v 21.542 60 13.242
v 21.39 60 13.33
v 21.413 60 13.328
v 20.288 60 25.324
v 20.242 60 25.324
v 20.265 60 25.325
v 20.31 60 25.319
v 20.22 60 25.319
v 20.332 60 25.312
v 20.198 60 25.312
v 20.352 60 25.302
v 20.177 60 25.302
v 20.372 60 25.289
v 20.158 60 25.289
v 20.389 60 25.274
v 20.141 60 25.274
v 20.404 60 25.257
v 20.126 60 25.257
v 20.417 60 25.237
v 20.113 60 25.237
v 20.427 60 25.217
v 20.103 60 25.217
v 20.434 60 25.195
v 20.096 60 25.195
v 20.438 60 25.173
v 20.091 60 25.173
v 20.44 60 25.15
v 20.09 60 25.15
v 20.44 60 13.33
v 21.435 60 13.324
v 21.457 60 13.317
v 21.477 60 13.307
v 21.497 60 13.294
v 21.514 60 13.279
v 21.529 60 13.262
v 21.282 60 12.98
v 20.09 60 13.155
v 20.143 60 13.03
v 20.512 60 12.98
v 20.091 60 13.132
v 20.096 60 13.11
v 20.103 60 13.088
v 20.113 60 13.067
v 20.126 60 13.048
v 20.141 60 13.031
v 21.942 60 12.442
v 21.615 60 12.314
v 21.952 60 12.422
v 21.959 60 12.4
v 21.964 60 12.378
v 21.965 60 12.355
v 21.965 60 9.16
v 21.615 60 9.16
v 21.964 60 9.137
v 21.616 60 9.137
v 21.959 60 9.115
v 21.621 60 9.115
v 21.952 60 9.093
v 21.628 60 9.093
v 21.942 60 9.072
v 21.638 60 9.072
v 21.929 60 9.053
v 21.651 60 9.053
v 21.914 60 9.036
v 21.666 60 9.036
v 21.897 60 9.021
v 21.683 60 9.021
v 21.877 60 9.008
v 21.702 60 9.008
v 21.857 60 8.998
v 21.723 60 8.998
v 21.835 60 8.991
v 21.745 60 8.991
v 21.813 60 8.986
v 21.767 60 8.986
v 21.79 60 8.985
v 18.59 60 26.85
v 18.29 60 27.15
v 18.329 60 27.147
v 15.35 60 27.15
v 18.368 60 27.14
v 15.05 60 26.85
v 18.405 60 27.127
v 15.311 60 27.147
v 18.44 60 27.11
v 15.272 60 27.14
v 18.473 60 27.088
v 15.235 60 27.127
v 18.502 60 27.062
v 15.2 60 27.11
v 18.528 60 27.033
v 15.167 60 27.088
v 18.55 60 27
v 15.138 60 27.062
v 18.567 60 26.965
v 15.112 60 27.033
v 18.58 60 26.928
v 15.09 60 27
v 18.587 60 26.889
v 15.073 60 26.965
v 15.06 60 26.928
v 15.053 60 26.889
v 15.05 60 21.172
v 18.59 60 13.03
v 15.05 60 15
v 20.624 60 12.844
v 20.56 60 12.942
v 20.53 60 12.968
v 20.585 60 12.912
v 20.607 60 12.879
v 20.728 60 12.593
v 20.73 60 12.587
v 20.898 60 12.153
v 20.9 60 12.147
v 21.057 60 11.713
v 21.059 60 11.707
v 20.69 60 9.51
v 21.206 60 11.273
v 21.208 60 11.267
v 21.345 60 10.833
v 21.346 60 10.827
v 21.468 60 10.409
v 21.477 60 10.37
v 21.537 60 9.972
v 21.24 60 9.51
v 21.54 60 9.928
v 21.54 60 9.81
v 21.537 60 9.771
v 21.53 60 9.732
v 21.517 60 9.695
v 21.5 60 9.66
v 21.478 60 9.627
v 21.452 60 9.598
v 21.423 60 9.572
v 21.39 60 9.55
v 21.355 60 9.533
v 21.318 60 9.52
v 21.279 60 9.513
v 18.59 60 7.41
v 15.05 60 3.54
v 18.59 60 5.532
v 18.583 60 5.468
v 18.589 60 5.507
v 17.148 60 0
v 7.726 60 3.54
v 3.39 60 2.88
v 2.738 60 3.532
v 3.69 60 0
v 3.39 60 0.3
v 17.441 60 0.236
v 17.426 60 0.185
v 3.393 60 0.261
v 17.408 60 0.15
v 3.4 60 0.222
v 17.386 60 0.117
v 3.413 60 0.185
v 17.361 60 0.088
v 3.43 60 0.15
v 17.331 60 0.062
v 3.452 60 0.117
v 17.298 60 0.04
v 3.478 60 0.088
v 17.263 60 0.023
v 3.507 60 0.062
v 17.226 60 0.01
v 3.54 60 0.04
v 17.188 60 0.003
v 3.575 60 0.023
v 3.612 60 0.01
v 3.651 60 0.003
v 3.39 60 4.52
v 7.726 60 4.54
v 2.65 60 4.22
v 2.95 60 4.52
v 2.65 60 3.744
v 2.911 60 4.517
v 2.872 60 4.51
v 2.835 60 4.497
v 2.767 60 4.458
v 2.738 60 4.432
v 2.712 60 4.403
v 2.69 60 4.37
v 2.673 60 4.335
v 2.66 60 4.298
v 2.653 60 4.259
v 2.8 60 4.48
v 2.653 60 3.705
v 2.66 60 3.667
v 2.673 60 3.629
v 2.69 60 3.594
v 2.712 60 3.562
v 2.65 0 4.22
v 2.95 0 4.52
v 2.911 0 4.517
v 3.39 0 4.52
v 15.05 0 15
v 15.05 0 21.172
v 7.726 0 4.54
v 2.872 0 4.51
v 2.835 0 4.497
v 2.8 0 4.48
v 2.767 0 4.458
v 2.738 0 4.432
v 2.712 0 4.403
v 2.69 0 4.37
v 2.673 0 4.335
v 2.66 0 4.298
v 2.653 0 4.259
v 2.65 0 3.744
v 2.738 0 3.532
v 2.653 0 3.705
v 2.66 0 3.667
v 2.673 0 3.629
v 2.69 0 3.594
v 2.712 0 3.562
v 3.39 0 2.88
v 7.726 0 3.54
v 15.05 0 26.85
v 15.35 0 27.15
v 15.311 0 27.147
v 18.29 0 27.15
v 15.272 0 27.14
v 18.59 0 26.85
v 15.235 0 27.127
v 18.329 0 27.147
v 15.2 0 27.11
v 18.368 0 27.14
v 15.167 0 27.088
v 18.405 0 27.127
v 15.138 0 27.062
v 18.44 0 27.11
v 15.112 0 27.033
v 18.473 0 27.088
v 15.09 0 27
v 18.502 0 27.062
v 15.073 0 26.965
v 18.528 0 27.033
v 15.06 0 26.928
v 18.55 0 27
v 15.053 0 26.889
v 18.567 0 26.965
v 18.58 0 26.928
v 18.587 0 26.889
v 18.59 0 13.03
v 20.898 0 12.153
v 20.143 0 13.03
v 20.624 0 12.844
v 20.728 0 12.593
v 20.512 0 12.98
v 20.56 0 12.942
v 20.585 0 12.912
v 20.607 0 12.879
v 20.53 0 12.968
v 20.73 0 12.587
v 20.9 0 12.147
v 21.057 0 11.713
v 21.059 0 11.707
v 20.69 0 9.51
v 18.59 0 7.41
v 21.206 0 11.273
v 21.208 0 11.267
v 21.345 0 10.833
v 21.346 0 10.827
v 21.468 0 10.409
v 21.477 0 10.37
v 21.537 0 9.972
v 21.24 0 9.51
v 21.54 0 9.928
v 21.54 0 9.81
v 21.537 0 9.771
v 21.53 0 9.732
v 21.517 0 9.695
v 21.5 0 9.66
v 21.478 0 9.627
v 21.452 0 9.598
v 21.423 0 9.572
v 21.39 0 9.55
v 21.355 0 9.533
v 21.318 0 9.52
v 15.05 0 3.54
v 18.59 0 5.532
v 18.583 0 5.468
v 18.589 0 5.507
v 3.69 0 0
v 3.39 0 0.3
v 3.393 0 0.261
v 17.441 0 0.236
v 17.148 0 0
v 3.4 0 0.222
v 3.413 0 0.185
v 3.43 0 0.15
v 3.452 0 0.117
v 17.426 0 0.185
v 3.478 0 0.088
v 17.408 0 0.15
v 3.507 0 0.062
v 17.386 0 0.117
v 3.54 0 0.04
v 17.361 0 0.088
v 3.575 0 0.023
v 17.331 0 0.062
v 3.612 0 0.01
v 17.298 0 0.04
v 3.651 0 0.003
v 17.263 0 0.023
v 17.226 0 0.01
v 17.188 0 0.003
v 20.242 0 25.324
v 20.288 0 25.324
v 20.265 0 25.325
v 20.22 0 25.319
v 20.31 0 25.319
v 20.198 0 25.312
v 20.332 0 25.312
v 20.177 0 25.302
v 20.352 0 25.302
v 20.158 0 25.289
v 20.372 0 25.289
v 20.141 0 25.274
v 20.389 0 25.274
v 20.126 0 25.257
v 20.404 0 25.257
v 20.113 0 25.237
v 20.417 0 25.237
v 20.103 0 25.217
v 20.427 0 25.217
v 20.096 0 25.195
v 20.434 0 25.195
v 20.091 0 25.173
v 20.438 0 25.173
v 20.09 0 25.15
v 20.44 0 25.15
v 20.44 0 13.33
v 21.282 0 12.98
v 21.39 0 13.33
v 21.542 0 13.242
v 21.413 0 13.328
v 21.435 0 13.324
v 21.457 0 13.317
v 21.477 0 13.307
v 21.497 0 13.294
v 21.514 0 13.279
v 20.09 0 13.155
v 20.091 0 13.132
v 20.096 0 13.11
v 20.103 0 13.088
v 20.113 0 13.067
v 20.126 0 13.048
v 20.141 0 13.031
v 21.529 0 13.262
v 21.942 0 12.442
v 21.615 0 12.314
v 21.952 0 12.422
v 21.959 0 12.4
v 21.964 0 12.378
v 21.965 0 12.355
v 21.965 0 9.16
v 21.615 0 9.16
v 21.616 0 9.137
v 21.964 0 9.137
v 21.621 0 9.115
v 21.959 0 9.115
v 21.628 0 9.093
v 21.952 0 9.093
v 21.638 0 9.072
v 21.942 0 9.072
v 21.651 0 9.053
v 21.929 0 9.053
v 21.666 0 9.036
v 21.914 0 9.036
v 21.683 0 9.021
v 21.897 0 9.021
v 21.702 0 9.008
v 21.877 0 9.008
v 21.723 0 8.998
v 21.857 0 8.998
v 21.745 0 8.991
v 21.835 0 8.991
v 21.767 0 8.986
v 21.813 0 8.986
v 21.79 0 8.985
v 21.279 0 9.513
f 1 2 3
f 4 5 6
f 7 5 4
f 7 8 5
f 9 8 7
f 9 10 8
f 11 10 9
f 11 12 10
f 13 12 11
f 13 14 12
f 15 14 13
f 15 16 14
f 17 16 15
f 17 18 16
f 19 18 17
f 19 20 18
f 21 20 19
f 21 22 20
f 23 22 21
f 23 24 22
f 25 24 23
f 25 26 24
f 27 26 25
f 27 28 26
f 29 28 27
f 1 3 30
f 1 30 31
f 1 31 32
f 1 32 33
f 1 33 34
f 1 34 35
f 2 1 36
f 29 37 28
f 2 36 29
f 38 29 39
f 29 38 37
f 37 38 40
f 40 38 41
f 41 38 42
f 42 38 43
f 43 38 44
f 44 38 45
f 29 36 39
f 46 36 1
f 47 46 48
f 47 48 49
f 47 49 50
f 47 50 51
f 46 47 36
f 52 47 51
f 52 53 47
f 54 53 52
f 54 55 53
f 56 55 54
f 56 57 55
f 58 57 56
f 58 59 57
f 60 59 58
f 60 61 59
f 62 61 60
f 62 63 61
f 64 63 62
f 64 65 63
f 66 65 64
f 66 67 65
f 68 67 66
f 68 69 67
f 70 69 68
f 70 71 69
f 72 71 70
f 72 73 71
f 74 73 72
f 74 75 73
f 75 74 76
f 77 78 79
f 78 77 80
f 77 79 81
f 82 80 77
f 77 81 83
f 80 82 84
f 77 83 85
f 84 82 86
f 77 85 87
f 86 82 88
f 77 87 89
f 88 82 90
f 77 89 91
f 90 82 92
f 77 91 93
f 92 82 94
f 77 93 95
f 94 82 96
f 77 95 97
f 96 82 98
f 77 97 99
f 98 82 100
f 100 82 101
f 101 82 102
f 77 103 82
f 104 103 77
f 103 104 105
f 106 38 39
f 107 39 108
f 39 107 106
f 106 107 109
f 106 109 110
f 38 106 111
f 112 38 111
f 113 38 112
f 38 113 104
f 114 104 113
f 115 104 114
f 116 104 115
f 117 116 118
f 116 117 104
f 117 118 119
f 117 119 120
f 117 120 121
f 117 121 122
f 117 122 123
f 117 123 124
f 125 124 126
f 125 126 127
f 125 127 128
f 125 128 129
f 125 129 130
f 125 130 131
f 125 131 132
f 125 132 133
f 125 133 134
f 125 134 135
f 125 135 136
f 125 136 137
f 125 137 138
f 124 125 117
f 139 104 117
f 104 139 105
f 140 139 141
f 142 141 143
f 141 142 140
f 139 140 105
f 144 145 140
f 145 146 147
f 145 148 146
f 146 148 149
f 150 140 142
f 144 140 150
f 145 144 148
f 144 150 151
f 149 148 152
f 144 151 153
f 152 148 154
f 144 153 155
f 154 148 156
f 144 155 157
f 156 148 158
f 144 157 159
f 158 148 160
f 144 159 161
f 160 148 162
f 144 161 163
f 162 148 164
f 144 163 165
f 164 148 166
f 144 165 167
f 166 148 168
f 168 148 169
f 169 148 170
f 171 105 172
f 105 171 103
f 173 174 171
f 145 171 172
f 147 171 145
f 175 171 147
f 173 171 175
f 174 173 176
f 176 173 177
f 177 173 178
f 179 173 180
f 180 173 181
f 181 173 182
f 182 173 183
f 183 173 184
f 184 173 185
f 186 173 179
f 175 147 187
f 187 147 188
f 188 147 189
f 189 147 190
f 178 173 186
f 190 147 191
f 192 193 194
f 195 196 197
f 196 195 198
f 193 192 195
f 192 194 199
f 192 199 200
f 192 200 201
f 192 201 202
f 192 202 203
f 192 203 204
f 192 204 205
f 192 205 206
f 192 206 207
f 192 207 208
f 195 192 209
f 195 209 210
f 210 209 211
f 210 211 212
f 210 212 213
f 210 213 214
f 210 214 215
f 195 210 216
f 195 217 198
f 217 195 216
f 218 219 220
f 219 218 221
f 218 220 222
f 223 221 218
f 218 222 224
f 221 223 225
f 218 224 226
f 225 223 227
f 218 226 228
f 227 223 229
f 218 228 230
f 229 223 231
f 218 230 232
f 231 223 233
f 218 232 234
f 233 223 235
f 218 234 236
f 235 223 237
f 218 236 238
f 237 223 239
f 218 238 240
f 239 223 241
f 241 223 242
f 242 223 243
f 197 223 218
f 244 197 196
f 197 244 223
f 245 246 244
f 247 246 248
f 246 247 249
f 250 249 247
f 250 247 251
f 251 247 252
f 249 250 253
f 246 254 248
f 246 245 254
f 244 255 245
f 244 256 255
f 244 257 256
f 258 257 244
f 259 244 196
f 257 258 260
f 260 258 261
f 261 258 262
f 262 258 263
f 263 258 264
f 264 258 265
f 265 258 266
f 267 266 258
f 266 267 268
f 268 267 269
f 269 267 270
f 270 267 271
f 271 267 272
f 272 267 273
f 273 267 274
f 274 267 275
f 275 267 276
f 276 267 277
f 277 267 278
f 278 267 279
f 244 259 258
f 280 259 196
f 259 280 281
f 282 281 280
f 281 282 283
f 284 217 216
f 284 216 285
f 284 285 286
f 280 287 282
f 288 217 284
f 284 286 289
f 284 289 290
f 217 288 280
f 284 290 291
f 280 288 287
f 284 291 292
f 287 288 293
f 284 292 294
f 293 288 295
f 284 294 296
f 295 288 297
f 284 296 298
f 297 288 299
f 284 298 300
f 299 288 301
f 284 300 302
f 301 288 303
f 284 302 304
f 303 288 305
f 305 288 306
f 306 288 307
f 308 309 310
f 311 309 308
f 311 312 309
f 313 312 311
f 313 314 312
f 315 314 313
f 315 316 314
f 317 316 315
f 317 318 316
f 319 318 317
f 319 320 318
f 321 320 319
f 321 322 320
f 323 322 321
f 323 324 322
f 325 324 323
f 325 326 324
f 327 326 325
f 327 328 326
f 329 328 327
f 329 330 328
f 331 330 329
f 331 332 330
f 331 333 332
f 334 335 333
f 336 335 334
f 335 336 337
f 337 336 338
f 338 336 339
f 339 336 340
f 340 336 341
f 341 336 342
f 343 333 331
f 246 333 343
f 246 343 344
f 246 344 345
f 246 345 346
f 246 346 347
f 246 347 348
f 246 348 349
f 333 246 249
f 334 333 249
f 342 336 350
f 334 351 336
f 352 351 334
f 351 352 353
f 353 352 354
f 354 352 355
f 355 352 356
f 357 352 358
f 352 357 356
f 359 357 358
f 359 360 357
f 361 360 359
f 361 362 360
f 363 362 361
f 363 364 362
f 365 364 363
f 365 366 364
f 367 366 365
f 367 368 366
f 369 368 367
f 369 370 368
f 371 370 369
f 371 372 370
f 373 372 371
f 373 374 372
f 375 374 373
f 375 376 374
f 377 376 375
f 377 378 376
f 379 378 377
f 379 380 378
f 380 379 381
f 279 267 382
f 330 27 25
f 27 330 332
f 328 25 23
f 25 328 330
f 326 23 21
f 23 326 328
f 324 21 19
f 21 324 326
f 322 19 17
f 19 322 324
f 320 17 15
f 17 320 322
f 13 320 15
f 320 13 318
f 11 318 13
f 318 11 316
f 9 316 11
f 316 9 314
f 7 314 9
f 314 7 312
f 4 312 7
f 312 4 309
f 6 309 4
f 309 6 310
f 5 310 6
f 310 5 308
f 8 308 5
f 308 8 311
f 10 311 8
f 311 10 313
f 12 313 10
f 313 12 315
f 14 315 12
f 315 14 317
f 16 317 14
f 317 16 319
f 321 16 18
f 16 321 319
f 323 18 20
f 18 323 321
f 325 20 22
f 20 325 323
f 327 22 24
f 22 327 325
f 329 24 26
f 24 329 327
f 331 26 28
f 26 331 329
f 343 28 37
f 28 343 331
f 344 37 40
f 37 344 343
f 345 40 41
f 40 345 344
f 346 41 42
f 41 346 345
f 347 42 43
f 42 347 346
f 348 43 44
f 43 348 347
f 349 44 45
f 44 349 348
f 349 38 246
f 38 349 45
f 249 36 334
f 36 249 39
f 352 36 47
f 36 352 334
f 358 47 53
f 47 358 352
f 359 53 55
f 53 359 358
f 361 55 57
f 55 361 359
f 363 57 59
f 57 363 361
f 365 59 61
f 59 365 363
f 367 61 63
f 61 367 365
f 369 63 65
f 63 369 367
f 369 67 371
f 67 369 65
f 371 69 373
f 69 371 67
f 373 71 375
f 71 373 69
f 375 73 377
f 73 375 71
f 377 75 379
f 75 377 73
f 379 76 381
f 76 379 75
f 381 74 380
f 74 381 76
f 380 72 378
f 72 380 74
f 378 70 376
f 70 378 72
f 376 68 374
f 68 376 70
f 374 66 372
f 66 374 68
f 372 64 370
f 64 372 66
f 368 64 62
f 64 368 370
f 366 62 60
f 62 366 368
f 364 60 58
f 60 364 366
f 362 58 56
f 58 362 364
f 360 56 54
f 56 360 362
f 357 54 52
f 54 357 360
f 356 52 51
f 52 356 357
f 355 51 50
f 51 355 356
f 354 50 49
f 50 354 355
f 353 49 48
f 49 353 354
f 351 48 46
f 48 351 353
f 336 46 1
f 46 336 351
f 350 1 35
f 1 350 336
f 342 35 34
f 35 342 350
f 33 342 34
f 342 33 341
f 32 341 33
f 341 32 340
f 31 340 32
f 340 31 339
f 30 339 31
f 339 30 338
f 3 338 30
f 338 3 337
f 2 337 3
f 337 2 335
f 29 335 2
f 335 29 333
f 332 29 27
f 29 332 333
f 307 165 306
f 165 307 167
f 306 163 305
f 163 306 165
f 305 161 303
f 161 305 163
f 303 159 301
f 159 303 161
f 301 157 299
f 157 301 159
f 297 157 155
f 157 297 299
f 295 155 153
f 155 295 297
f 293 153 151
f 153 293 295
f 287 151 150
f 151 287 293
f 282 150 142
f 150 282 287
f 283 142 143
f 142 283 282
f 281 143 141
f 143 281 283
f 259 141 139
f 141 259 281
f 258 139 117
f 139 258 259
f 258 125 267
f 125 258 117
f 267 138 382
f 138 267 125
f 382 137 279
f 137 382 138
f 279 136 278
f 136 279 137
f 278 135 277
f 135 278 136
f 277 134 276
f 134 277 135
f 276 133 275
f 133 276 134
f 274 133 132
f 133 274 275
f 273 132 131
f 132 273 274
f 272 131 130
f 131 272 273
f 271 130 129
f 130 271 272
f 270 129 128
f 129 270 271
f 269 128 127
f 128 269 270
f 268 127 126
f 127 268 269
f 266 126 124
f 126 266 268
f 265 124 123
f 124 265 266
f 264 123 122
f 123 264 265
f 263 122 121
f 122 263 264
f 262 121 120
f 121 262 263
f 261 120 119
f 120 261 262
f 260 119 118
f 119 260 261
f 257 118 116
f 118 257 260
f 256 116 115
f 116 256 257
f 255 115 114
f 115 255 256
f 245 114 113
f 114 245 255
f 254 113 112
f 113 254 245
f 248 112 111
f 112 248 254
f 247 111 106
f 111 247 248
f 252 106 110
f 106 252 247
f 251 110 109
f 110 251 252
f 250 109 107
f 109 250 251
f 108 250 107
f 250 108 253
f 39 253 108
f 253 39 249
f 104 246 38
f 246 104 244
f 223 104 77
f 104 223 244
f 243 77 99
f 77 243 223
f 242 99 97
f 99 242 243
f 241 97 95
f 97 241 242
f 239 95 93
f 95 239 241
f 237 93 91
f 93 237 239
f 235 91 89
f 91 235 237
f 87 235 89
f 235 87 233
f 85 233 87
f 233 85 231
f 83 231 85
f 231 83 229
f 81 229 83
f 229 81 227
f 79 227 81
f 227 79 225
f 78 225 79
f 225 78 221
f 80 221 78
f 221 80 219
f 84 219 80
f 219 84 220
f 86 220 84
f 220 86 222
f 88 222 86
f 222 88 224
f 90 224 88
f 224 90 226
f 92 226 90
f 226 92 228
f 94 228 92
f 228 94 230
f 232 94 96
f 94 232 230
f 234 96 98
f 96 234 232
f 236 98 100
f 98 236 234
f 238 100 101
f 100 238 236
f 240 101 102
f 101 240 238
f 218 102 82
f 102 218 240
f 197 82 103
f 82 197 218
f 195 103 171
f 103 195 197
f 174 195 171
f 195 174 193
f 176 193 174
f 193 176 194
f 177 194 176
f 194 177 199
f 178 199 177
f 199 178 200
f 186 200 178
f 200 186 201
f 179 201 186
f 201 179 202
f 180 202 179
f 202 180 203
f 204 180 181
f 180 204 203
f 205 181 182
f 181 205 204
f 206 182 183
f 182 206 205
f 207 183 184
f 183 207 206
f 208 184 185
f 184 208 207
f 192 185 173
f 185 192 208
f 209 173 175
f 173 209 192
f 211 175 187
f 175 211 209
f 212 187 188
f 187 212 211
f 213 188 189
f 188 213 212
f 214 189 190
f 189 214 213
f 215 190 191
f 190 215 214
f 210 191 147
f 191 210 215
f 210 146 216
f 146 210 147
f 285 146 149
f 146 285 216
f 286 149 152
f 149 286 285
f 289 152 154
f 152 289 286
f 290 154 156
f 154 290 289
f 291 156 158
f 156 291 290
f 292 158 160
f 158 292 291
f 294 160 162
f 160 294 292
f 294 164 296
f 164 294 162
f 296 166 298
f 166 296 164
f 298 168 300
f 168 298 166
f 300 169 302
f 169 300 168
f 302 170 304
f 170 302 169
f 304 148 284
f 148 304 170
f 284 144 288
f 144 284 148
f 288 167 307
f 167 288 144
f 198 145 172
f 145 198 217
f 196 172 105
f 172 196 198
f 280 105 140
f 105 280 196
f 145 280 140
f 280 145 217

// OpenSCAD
// screen-fence-rail.scad
//
// Snap-in fence for the bottom track of the roll-up screen doors. It drops into
// the track from the room side, hooks under the near wall's internal ledge, and
// reaches across to trap the screen mesh under the far wall's top lip — so a cat
// can no longer pull the mesh out of the channel and climb under it.
//
// Replaces _incoming/screen-fence-rail.stl, which was glued into the channel
// and failed twice over: the bond let go, and it did not actually stop the cats.
// Nothing here is glued.
//
// ---------------------------------------------------------------------------
// THE TRACK, AS MEASURED
// ---------------------------------------------------------------------------
// Reverse-engineered from _incoming/bottom-track-dimensions.png. That drawing
// is to scale: its 23.8 mm width, 15.9 mm height and 6.4 mm ledge datum all
// resolve to 56.66 px/mm, three independent agreements. Its "9.5 mm" is the
// only figure that does not — the extension line sits 1.6 mm high — but 9.5
// is 15.9 - 6.4, so the VALUE is right and only its witness line is misplaced.
//
// The profile is an aluminium extrusion, 0.76 mm wall throughout, 23.80 mm
// across the outside, 15.90 mm tall, with an inner floor 0.79 mm above the
// outer bottom. Every number below is referenced to that inner floor, and to
// the inner face of one wall, because those are the surfaces a part inside the
// channel actually touches. Each wall carries three inward features:
//
//     z 4.77 - 5.65   LEDGE      reaches 3.14 mm inboard   (gap 15.76 mm)
//     z 6.96 - 9.01   MID HOOK   reaches 1.35 mm inboard   (gap 19.34 mm)
//     z 13.28 - 15.15 TOP LIP    reaches 1.35 mm inboard   (gap 19.34 mm)
//
// ⚠️ These are read off a drawing, not off the rail. The outline is drawn with
// a 0.26 mm line and the readings take its inner edge, so the real clear space
// is up to ~0.13 mm larger than assumed here — i.e. the part errs small, which
// is the safe direction. The one figure worth a caliper before printing 200 mm
// is the 22.04 mm clear width; print show="coupon" and try the three fits.
//
// ---------------------------------------------------------------------------
// WHY THIS SHAPE
// ---------------------------------------------------------------------------
// The mesh floats free in the channel. The first version of this part left it a
// clear 2.10 mm slot and only stopped it being pushed INBOARD — which was not
// the failure: the mesh is flexible, the cats pull it up OUT of the channel and
// go under. Holding it therefore means gripping the mesh itself, not just
// walling it in. See the back grip parameters.
//
// The part still cannot be a symmetric two-sided snap. The mesh must remain free
// to slide along the track, and a rigid part cannot engage an undercut on both
// walls at once and still get in — see the dead ends below. So the structural
// grip comes off the near wall alone, and the far side does its work by pinching
// rather than by hooking under anything it has to fight its way past.
//
// Of the three features on that wall the LEDGE is the one worth having: 3.14 mm
// of positive undercut against 1.35 mm at either hook, and the chamber beneath
// it is the one region of the section the mesh cannot reach (the far ledge stops
// the mesh descending past z 5.65). So the part carries a wedge-shaped tongue
// that slides under the near ledge, and stands on the channel floor.
//
// It is NOT a cantilever snap. Nothing here has to flex to go in: tilt the part
// so the tongue leads, slide the tongue under the ledge, then rotate the far
// side down until the base plate lies on the floor. That was a deliberate
// choice — a PETG finger long enough to clear the 1.35 mm hooks without
// over-straining has to be anchored above the rail, and every version of that
// put a truss in a doorway. Seated, the part is held by:
//
//   * UP          the tongue, under 2.84 mm of aluminium ledge.
//   * DOWN        the base plate, flat on the channel floor.
//   * OUTBOARD    the ramp root, 0.25 mm off the near ledge tip.
//   * INBOARD     the fence face, 0.31 mm off the far ledge tip — so the part
//                 can travel a third of a millimetre before it is stopped, and
//                 the tongue never comes close to disengaging.
//   * TIPPING OUT a push on the fence from the room side is the load case that
//                 matters, and it drives the tongue harder under the ledge.
//   * THE BACK    the rib's top face sits under the far top lip with 0.85 mm of
//                 overlap, so the far side is positively capped as well.
//
// Rotating the far side up is the removal motion, and the only way out. A cat
// is on the wrong side of the fence to do it.
//
// MESH SAFETY. The mesh is squeezed, so the faces that touch it matter. Every
// corner it wraps is rounded by the global fillet, the pinch bears on a flat
// 0.85 mm land rather than an edge, and the fence face is printed as a vertical
// wall so its layer lines run along the direction the mesh travels. The pinch is
// a tenth of a millimetre on a compressible woven mesh — enough for friction,
// not enough to cut. back_pinch is the number to tune, and the coupon ladders
// it.
//
// STRENGTH. The fence is the handle, so it is sized for hand loads, not for
// looks: the first printed coupon snapped the moment it was pushed on. Printed
// lying down, pushing or pulling the fence bends it ACROSS the layers, so the
// two levers that matter are its thickness (wall, doubled to 3.54) and its
// unsupported length (set by ramp_angle, which carries the ramp up to meet it
// 6 mm from the top instead of 11). Together, about 8x less root stress.
//
// PRINT. Lying down, cross-section in the bed's XZ, length along Y — as built.
// The base plate gives a 15.2 x seg_len first layer and the fence face is a
// vertical wall. The only overhang is the tongue's underside, cut at 45 deg.
// Fence and mesh face are both 1.74 mm, four lines at the 0.4 nozzle's real
// inner width. PETG.

/* [Output] */

// "fence" is the printable part. "coupon" is three 30 mm slices at different
// back pinches — print it and find which one grips the mesh and still rotates
// home, before committing to a full segment.
//
// "track" is the aluminium extrusion itself, drawn from the measured profile,
// and "assembly" shows the fence hooked into it with the mesh in the slot.
// Both are previews for checking the interlock by eye — NOT for printing. If
// you ever want one as an STL, build it with --name so it does not overwrite
// the fence's own version series.
// "fitcheck" is the interference test — see the module.
//
// This defaults to a PREVIEW, not the part, so that opening the file in
// OpenSCAD shows the fence in the rail without touching anything. The cost is
// that building the part now needs the flag:
//
//     utils/build.sh parts/screen-fence-rail.scad -D 'show="fence"'
//
// A bare build.sh run would otherwise stamp the assembly into the fence's own
// version series and leave stl/screen-fence-rail.stl pointing at a rail with a
// fence inside it. There is an echo at the bottom of this file to catch that.
show = "assembly";  // [fence, coupon, track, assembly, fitcheck, compare, concepts, fixture]

// COUPON-COMPONENTS: fit=coupon
// COUPON-PLATE: coupon

/* [Track — MEASURED, see header. Do not change without re-measuring] */

// Clear width of the channel, inner wall face to inner wall face (mm).
trk_clear_w  = 22.04;
// Inner floor to the top of the walls (mm).
trk_depth    = 15.15;
// How far the mid hooks and the top lips reach inboard of the wall face (mm).
trk_hook_x   = 1.35;
// How far the lower ledge reaches inboard of the wall face (mm).
trk_ledge_x  = 3.14;
// Underside of the lower ledge, above the inner floor (mm).
trk_ledge_z0 = 4.77;
// Top face of the lower ledge, above the inner floor (mm).
trk_ledge_z1 = 5.65;
// Underside and top of the mid hook, above the inner floor (mm).
trk_hook_z0  = 6.96;
trk_hook_z1  = 9.01;
// Underside of the top rolled lip, above the inner floor (mm).
trk_lip_z0   = 13.28;

/* [Track shell — drawing only, nothing is designed against these] */

// Outside of the extrusion (mm) — the two figures the drawing dimensions
// directly, and the two that fixed its scale.
trk_outer_w = 23.80;
trk_outer_h = 15.90;

// Wall and base skin (mm), from the centre-to-centre spacing of the drawn wall
// lines.
//
// NOTE the deliberate inconsistency: 23.80 - 2 x 0.77 is 22.26, but
// trk_clear_w above is 22.04. That is not an error. 22.04 is the reading taken
// from the INNER edges of those same lines, and the fence is designed against
// it precisely because it is the pessimistic one — the part comes out up to
// 0.22 mm narrower than it needs to be, which is the safe direction. So the
// preview shows about 0.11 mm more room per side than the fence assumes. Below
// the drawing's resolution, and it errs the right way.
trk_skin = 0.77;

// Diameter of the void inside the rolled hook and the rolled top lip (mm).
// Cosmetic — it is what makes them read as curls rather than plain beads.
trk_roll_void = 0.55;

/* [Concept study — previews only, none of these is print-ready] */

// The rotate-in concept is dead: a full configuration-space path search says
// the seated pose is unreachable, and the maximum under-ledge engagement any
// RIGID motion can insert is 0.54 mm against the 2.84 mm designed. See the
// round 01f notes. These are the three replacements, drawn to compare.
//
//   slide  Today's section, unchanged. Only goes in by sliding along the rail
//          from its end. Keeps the deep tongue, the deep rib and positive
//          retention every way. Strongest by far; needs end access.
//   drop   Fits the 15.76 mm gap between the ledge tips at EVERY height, so it
//          lowers straight in. The deep back rib cannot exist. Hold-down is
//          barbs that flex in past the ledge tips and spring out under them;
//          the mesh is pinched against the far hook tips by the fence face.
//   key    Two pieces. The body drops in, slides outboard under the far ledge;
//          then a key drops in beside it and slides under the near ledge,
//          filling the gap so neither can come back. Positive at both ends and
//          nothing flexes, at the cost of a second piece to fit each time.
concept = "slide";  // [slide, drop, key]

// Clearance each side of the ledge-tip aperture for the drop-in body (mm).
drop_clr = 0.23;
// How far the key concept's body slides outboard once it is down (mm).
key_push = 2.40;
// How far the drop concept's barbs stand out past the body's face (mm). Net
// engagement under the ledge tip is this minus drop_clr, so 1.50 buys 1.27 mm
// of hook — and costs 1.50 mm of inward flex on insertion, which needs a leg
// of at least 10.2 mm at 1.29 mm thick to stay inside PETG's strain budget.
drop_barb = 1.50;

/* [Test fixture — a printable stand-in for the real rail] */

// A length of the channel to print and keep on the bench, so insertion can be
// tried without going upstairs to the door.
//
// It is NOT a replica of the extrusion. Only the INTERNAL surfaces matter for
// testing whether a part goes in, so the outside is a solid block: it prints
// rigid, sits flat on any face, and gives a real first layer instead of the
// 0.77 mm ribbon the aluminium's own section would.
//
// PRINT IT STANDING UP — the channel axis vertical, which is how it is built
// here. That puts every internal face vertical, so the ledges' undersides and
// the rolled hooks come out as walls rather than overhangs, and the two
// apertures the insertion actually depends on are formed accurately. Printed
// lying down, the ledge undersides are 3.14 mm of unsupported horizontal
// overhang and the apertures would close up. Use it lying down once printed.
fixture_len  = 60;
// Solid wall around the cavity (mm).
fixture_wall = 3.0;
// Grow every aperture by this much per face (mm).
//
// Start at 0, print it, then mike the three numbers that matter and compare:
// overall clear width 22.04, the mouth between the top lips 19.34, and the gap
// between the ledge tips 15.76. This machine has no XY compensation set and a
// bore has measured 0.3 mm undersize per side in PETG, which would make the
// fixture TIGHTER than the real rail — the wrong direction, since it would
// fail parts that actually fit. Dial this until the printed apertures match.
fixture_comp = 0.00;

/* [Preview] */

// Length of track and fence drawn for "track" and "assembly" (mm). Short, so
// the section stays legible in a render.
preview_len = 60;

// Thickness of the mesh drawn in the slot (mm), and how far it stands above the
// top of the rail. Representative only — the mesh floats and is not modelled
// as anything but a flat strip.
mesh_t = 0.35;
mesh_rise = 10;

// Opacity of the track and the mesh in "assembly" — 0 invisible, 1 solid.
//
// The channel is a closed box in section, so an opaque rail hides the fence
// from every angle except looking straight down into it. Ghosting the track is
// what lets you see the tongue under the ledge and the fence at the same time.
// Transparency only works in Preview (F5); F6 discards it along with the
// colours. Set both to 1 if you want the view from outside, as installed.
// 0.25 was a mistake: silver that faint washes out to the background and the
// rail reads as missing. 0.55 is see-through and still obviously there.
track_alpha = 0.55;
mesh_alpha  = 0.70;

/* [Fit] */

// Clearance to every track surface (mm). Drives the tongue height and how
// close the part sits to the near ledge, so it is the one number the coupon
// tests. 0.25 is the 0.4-nozzle snug figure from the printer reference.
clr = 0.25;

// Clear slot left for the mesh, between the fence face and the far wall's
// hooks (mm). This also sets how far the part can shift before the far ledge
// tip stops it, so keep it well under the 2.84 mm the tongue engages.
mesh_slot = 2.10;

/* [Back grip — what actually holds the mesh down] */

// A free slot does not retain a flexible mesh: the cats pull it out and go
// under. So the back of the part carries a rib that reaches outboard into the
// recess between the far wall's mid hook and its top lip — 4.27 mm of clear
// height, the biggest feature on that wall. The mesh gets swept outboard as the
// part rotates home, drapes over the rib's top face and hangs down the slot
// outboard of it, and is then squeezed between that top face and the underside
// of the aluminium top lip. Pulling the mesh up only tightens it around the
// rib's corner. The rib's top face is also the back hold-down: it sits under
// the top lip with 0.85 mm of overlap.
back_grip = true;

// Gap between the rib's top face and the underside of the far top lip (mm).
// This is the pinch, so it wants to be a little LESS than the mesh is thick —
// the mesh is compressible and the faces either side of it are radiused. Too
// tight and the part will not rotate home; too loose and the mesh slides.
// The number to try first on the coupon.
back_pinch = 0.25;

// Slot left outboard of the rib for the mesh to hang down in (mm). Also caps
// how deep the rib goes at its lowest, where the swept arc is not the limit.
back_slot = 0.50;

// The front point the part rocks about, as (x, z) above the inner floor.
//
// The rib's back face is GENERATED from this — see rib_back() — so the shape
// cannot drift from the analysis that produced it. Rocking the part in sweeps
// every point of it round an arc centred here, and the arc has to be clear,
// not just the seated position. That is what limits how deep the back can go:
//
//     z 10 -> 21.58    z 11 -> 21.30    z 12 -> 20.96    z 13 -> 20.56
//
// The far wall's hook tips are at 20.69, so at the top lip's height the back
// can reach 20.62 and the tip is at 20.69. It cannot touch it, let alone get
// behind it. NO RIGID ROCK-IN CAN ENGAGE EITHER UNDERCUT ON THE FAR WALL: the
// arc moves inboard about 0.43 mm per mm of rise while the lip steps inboard
// 1.35 mm the instant you cross z 13.28. An earlier rib reached 21.54 and was
// 0.90 mm too deep, which is why it would not go in.
//
// Two pivots are plausible — the tongue tip, and the near ledge's edge, which
// is the truer model since rocking the back down presses the tongue's top face
// onto the ledge. They agree to 0.02 mm. These are the tongue-tip values, the
// more conservative of the two in the recess.
piv_x = 0.45;
piv_z = 4.50;

// Points sampled along the rib's curved back face.
rib_steps = 8;

/* [Front catch] */

// How far the tongue reaches inboard from the near wall's face (mm).
//
// THE HARD LIMIT. A configuration-space path search over every tilt from -100
// to +100 degrees and every translation says the deepest a RIGID part can hook
// under the near ledge and still be got into the channel is 0.54 mm — tongue
// at x 2.60 against a ledge tip at 3.14. The first design reached x 0.30, for
// 2.84 mm of hook, and that is why it would not go in no matter how it was
// rocked. Widening the tilt range to cover the face-first motion did not change
// the number.
//
// The useful discovery is that the two hooks were COMPETING. Give up the deep
// front tongue and the part becomes shallow enough to manoeuvre, which lets the
// back rib swing out to 21.54 — 0.85 mm under the far TOP LIP. So a rigid part
// can hook the front or the back, not both, and the back is the better one:
// 0.85 mm beats 0.49 mm, and it is the end the mesh pulls on.
//
// front = "flex" puts the tongue back to its deep 2.84 mm on a leg that bends
// out of the way going in, so both ends hook. See flex_tongue_L.
tongue_x = 2.65;
front    = "rigid";  // [rigid, flex]

// Deep reach for the flexing tongue (mm), and the free length of the leg that
// carries it. The leg must retract tongue_x - flex_tongue_x on the way in, so
// 2.35 mm at 1.29 mm thick needs at least 12.7 mm of leg to stay inside PETG's
// strain budget.
flex_tongue_x = 0.30;
flex_tongue_L = 14.0;

/* [Back grip variant — print both and compare] */

// "rigid" and "flex" are two answers to the same problem, and the arc analysis
// above is why there are two rather than one.
//
//   rigid  A continuous rib whose back face IS the swept-arc envelope, so it
//          goes exactly as deep as rocking the part in allows and no deeper —
//          20.6 at the top, 21.54 at the bottom. Nothing flexes, nothing can
//          fatigue. It does not get behind the hook tips, so the mesh is held
//          by the two folds it makes round them plus a squeeze where it
//          crosses the tip line. Shallow but continuous along the whole rail.
//
//   flex   Deep ribs, reaching 21.54 and properly behind the top lip's tip, on
//          cantilever fingers that deflect inboard about 0.9 mm to get past it
//          and spring back. Positive retention, but only at the stations —
//          which dimples the mesh along the rail rather than clamping it in a
//          line, and that zigzag is arguably the better hold. Costs a slot
//          through the fence at each station.
back = "rigid";  // [rigid, flex]

// Finger width along the rail, and spacing between stations (mm).
flex_w     = 12.0;
flex_pitch = 50.0;
// Finger thickness (mm). Thinner is a softer spring: strain goes as this, and
// at 1.29 with a 9.5 mm arm the 0.9 mm of deflection runs about 1.9 %, inside
// PETG's roughly 2.8 % working budget.
flex_t     = 1.29;
// Free arm from the anchor down to the rib's top corner, where the lip tip
// pushes it (mm). This is the strain lever — shortening it is what breaks it.
flex_L     = 9.50;
// How far the finger's free end hangs below the rib's underside, and the gap
// cut beneath it so it is genuinely free (mm).
flex_drop  = 2.40;
flex_free  = 1.20;

// Clearance between the rib's underside and the top of the far mid hook (mm).
back_clr = 0.50;

/* [Part] */

// Length of one segment along the rail (mm). 200 keeps the whole footprint
// inside the 205 mm safe envelope; butt them end to end to fill the opening.
seg_len = 200;

// How far the fence stands above the top of the rail (mm).
fence_h = 12;

// Angle of the ramp's top face off horizontal (degrees).
//
// This is a STRENGTH parameter, not a styling one. The fence is the handle —
// it is what you push on to rock the part in and pull on to get it out — and
// printed lying down, every one of those loads is bending across the layers,
// which is the weakest thing PETG does. The fence's unsupported length is
// whatever sticks up above the point the ramp meets it, and the root stress
// goes as that length, so steepening the ramp buys strength directly:
//
//     45 deg -> ramp meets the fence at z 16.2, 11.0 mm of free fin
//     55 deg -> ramp meets the fence at z 21.2,  6.0 mm of free fin
//
// With the doubled wall that is about 8x less root stress than the coupon that
// snapped. Steeper also prints better: the ramp's underside is the overhang,
// and 55 deg off horizontal is 35 deg off vertical, well inside the limit.
// Do not go past about 70 deg — the part turns into a solid block.
ramp_angle = 55;

// Wall thickness for the fence, the base plate and the ramp (mm).
//
// Was 1.74. Doubled on the strength of a printed part: Ziad called the first
// coupon "very fragile". 3.54 is the next rung up from 2 x 1.74 on the 0.4
// nozzle ladder (2 x 0.42 outer + 6 x 0.45 inner), and the fence is a 27 mm
// tall fin whose stiffness goes as the cube of this, so it gets 8x stiffer.
// Every rung: 0.84, 1.29, 1.74, 2.19, 2.64, 3.09, 3.54.
wall = 3.54;

// Height of the flat face at the tongue's tip (mm). Above this the tongue's
// underside is cut at 45 deg so it prints unsupported.
tip_face = 0.90;

// Solid gusset between the base plate and the ramp at the near-wall end (mm).
// The void behind the ramp starts this far inboard; without it the two plates
// would meet along a knife edge and hinge.
gusset = 2.60;

// Least height the void behind the ramp may have at its near end (mm).
//
// This is a guard, not a style choice. The void's ceiling is the ramp's
// underside, which sits wall x sqrt(2) below its top face — so at wall = 3.54
// that ceiling has dropped 5.01 mm and the void's near end would invert
// straight through the base plate. Rather than let the polygon self-intersect,
// the near end of the void is pushed inboard until it is at least this tall,
// and dropped altogether if it will not fit at all.
void_min = 1.00;

/* [Back relief — what lets it rock in] */

// Chamfer up the back face from the bottom (mm across, mm up).
//
// THIS IS WHY THE FIRST COUPON WOULD NOT GO IN. Rocking the back down swings
// the base plate's back bottom corner OUTBOARD on an arc, and at the far ledge
// tip's height that arc reaches about x 19.14 against a tip at 18.90 — so the
// corner jams on the ledge instead of passing under it. The whole back face
// below the ledge has to be cut back, not just the corner itself: with the
// pivot up at the tongue, every point on that face below z ~4 swings too wide.
//
// Losing that corner does not cost the lateral stop, because the back rib now
// provides it — 0.50 mm off the far wall against 2.82 mm of tongue engagement.
back_relief   = 1.20;
back_relief_h = 5.50;

// Radius rounded onto every convex corner (mm). Keep it small — the tongue's
// tip face is the thinnest feature and the rounding is cut out of it.
fillet = 0.30;

/* [Coupon] */

// Back pinches to try, one 30 mm slice each — notches on the fence top count
// the slice, tightest first.
//
// This tests back_pinch, not clr, because back_pinch is now the number the
// part lives or dies on and the one with no margin: it is a 0.25 mm gap set
// against a mesh whose thickness nobody has measured. The near-side clr has
// 2.82 mm of tongue engagement behind it and shrugs off a tenth either way.
// Want to ladder clr instead? Swap which one coupon_slice varies.
coupon_pinch = [0.20, 0.30, 0.40];
// Length of one coupon slice (mm).
coupon_len = 30;
// Gap between slices on the plate (mm).
coupon_gap = 8;
// Notch cut into the fence top to number a slice (mm).
coupon_notch_w = 2.0;
coupon_notch_d = 1.6;
coupon_notch_pitch = 5.0;

/* [Quality] */
$fn = 48;

// Overshoot on every subtracted solid so no cut face is coplanar with its
// parent's.
eps = 0.01;

// ---------------------------------------------------------------------------

// The cross-section, in the plane across the track: x measured inboard from the
// inner face of the NEAR wall, y measured up from the channel's inner floor.
// ---- derived, shared by the fence and the back-grip stations ----
x_fence_o  = trk_clear_w - trk_hook_x - mesh_slot;   // fence face, against the mesh
x_fence_i  = x_fence_o - wall;
x_tip_line = trk_clear_w - trk_hook_x;               // the far wall's hook tips
z_top      = trk_depth + fence_h;
rib_z0     = trk_hook_z1 + back_clr;
rib_deep   = trk_clear_w - back_slot;                // as deep as the mesh slot allows

// The swept-arc envelope, straight out of the rock-in analysis. See piv_x.
env_reach = pow(x_tip_line - clr - piv_x, 2) + pow(trk_lip_z0 - piv_z, 2);
env       = function (z) piv_x + sqrt(max(0, env_reach - pow(z - piv_z, 2)));
rib_back  = function (z) min(rib_deep, env(z));
rib_top   = function (pinch) trk_lip_z0 - pinch;

module profile(c = clr, pinch = back_pinch, ribmode = "auto") {
    mode      = ribmode != "auto" ? ribmode : (back == "flex" ? "none" : "env");
    x_tip     = (front == "flex") ? flex_tongue_x : tongue_x;   // tongue tip
    x_base    = trk_ledge_x + c;                           // ramp root / base plate, near end
    z_tongue  = trk_ledge_z0 - c;                          // tongue top, under the ledge
    z_tip     = z_tongue - tip_face;
    z_wedge   = z_tip - (x_base - x_tip);                  // 45 deg underside meets the base
    z_ramp    = z_tongue + (x_fence_i - x_base) * tan(ramp_angle);

    // Void behind the ramp. Bottom is the base plate's top face, ceiling is the
    // ramp's underside — 45 deg, so it needs no support. Its near end is the
    // gusset, or far enough inboard for the void to be void_min tall,
    // whichever is further in. See void_min.
    drop   = wall / cos(ramp_angle);   // vertical offset of a perpendicular wall
    hz     = function (x) z_tongue - drop + (x - x_base) * tan(ramp_angle);
    hx0    = max(x_base + gusset,
                 x_base + (wall + void_min - z_tongue + drop) / tan(ramp_angle));
    voided = hx0 < x_fence_i - void_min;

    if (z_ramp > z_top - wall)
        echo(str("WARNING: fence_h = ", fence_h, " is too short for the ramp; ",
                 "raise it above ", z_ramp + wall - trk_depth));

    // Back grip, walked up the far face in increasing z: the 45 deg underside,
    // which may only start sloping down INBOARD of the hook-tip line or it
    // fouls the mid hook; then out along the envelope. "none" leaves the face
    // flat — the flex variant carries its ribs separately, at the stations.
    rib_z1 = rib_top(pinch);
    rib = (!back_grip || mode == "none") ? [] : concat(
        [[x_fence_o,  rib_z0 - (x_tip_line - x_fence_o)],
         [x_tip_line, rib_z0]],
        [for (i = [0 : rib_steps])
            let (z = rib_z0 + (rib_z1 - rib_z0) * i / rib_steps)
            [rib_back(z), z]],
        [[x_fence_o,  rib_z1]]
    );

    offset(r = fillet) offset(delta = -fillet)
    difference() {
        polygon(concat(
            [[x_base,                 0            ],
             [x_fence_o - back_relief, 0           ],
             [x_fence_o,              back_relief_h]],
            rib,
            [[x_fence_o, z_top    ],
             [x_fence_i, z_top    ],
             [x_fence_i, z_ramp   ],
             [x_base,    z_tongue ],
             [x_tip,     z_tongue ],
             [x_tip,     z_tip    ],
             [x_base,    z_wedge  ]]
        ));

        if (voided)
            polygon([
                [hx0,       wall         ],
                [x_fence_i, wall         ],
                [x_fence_i, hz(x_fence_i)],
                [hx0,       hz(hx0)      ],
            ]);
    }
}

// Extrude a cross-section along the rail: y from y0, height ylen.
module along_y(y0, ylen) {
    translate([0, y0 + ylen, 0])
        rotate([90, 0, 0])
            linear_extrude(height = ylen, convexity = 10)
                children();
}

// The deep rib the flex variant carries at each station — reaching rib_deep,
// properly behind the top lip's tip, which the rigid variant cannot do. Runs
// 0.6 mm into the fence so the union is solid rather than face-to-face.
module rib_deep2d(pinch = back_pinch) {
    z1 = rib_top(pinch);
    offset(r = fillet) offset(delta = -fillet)
        polygon([
            [x_fence_o - 0.6, rib_z0 - (x_tip_line - x_fence_o)],
            [x_tip_line,      rib_z0],
            [rib_deep,        rib_z0],
            [rib_deep,        z1],
            [x_fence_o - 0.6, z1],
        ]);
}

// Centre of station i of n along a length.
function station_y(i, n, len) = len * (i + 0.5) / n;

// One length of fence, laid out for the plate: length along Y, height in Z.
module fence_length(len = seg_len, c = clr, pinch = back_pinch) {
    if (back == "flex") {
        za = rib_top(pinch) + flex_L;      // anchor: top of the relief slot
        zf = rib_z0 - flex_drop;           // free bottom end of the finger
        n  = max(1, floor(len / flex_pitch));

        union() {
            difference() {
                along_y(0, len) profile(c, pinch, "none");

                for (i = [0 : n - 1]) {
                    y0 = station_y(i, n, len) - flex_w / 2;
                    // relief behind the finger, so it has somewhere to flex to
                    translate([x_fence_i - eps, y0, zf])
                        cube([wall - flex_t + eps, flex_w, za - zf]);
                    // and a gap under its free end, or it is built in at both
                    // ends and will not flex at all
                    translate([x_fence_i - eps, y0, zf - flex_free])
                        cube([wall + 2 * eps, flex_w, flex_free]);
                }
            }
            for (i = [0 : n - 1])
                along_y(station_y(i, n, len) - flex_w / 2, flex_w)
                    rib_deep2d(pinch);
        }
    } else {
        along_y(0, len) profile(c, pinch, "env");
    }
}

module fence() {
    fence_length(seg_len, clr);
}

// ---------------------------------------------------------------------------
// The track, for looking at. Same origin as the fence: x inboard from the near
// wall's inner face, y up from the inner floor.
// ---------------------------------------------------------------------------

// A rolled edge — the mid hook and the top lip are both one of these. Sized to
// fill the measured envelope exactly: it spans z0..z1 and reaches x_reach
// inboard, and its far side runs back into the wall, which is what joins it on.
// solid = true gives a plain bead instead of the curl. Same envelope — the
// bead's innermost point is still x_reach at its mid height, which is the only
// thing an aperture depends on — but printable and properly attached.
//
// The curl is only worth drawing in a picture. In a printed fixture it is
// unbuildable and unsafe: the wall between the void and the outside works out
// at 0.75 mm, under two perimeters, and the slot that opens the void downward
// severs the bead from the wall over part of its height, leaving a lug the
// test part would snap off on its way past.
module rolled(x_reach, z0, z1, solid = false) {
    r = (z1 - z0) / 2;
    if (solid)
        translate([x_reach - r, (z0 + z1) / 2]) circle(r = r);
    else
        difference() {
            translate([x_reach - r, (z0 + z1) / 2]) circle(r = r);
            translate([x_reach - r, (z0 + z1) / 2]) circle(d = trk_roll_void);
            translate([x_reach - r - trk_roll_void / 2, z0 - eps])
                square([trk_roll_void, r + eps]);
        }
}

// The three inward features carried by one wall, drawn at the near wall.
module track_features(solid = false) {
    // Ledge, with the rounded tip the drawing shows. Left at its measured
    // 0.88 mm: that is two perimeters printed as a vertical wall, and its top
    // and bottom faces are the real datums the tongue hooks under, so it is
    // not a thickness to round up for printability.
    t = trk_ledge_z1 - trk_ledge_z0;
    hull() for (x = [t / 2, trk_ledge_x - t / 2])
        translate([x, trk_ledge_z0 + t / 2]) circle(d = t);

    rolled(trk_hook_x, trk_hook_z0, trk_hook_z1, solid);
    rolled(trk_hook_x, trk_lip_z0,  trk_depth,   solid);
}

module track_profile() {
    s  = trk_skin;
    wc = trk_outer_w - 2 * s;          // clear width implied by the outside
    fl = trk_outer_h - trk_depth;      // base skin

    union() {
        translate([-s, -fl]) square([wc + 2 * s, fl]);   // base
        translate([-s, -fl]) square([s, trk_depth + fl]);        // near wall
        translate([wc, -fl]) square([s, trk_depth + fl]);        // far wall

        for (m = [0, 1])
            translate([m * wc, 0]) mirror([m, 0]) track_features();
    }
}

// The channel's free space: the bore, less the features that intrude into it.
module fixture_cavity2d() {
    difference() {
        square([trk_clear_w, trk_depth + 10]);      // bore, open at the top
        offset(delta = -fixture_comp)
            for (m = [0, 1])
                translate([m * trk_clear_w, 0]) mirror([m, 0])
                    track_features(solid = true);
    }
}

module fixture(len = fixture_len) {
    fw = fixture_wall;
    linear_extrude(height = len, convexity = 10)
        difference() {
            translate([-fw, -fw])
                square([trk_clear_w + 2 * fw, trk_depth + fw]);
            fixture_cavity2d();
        }
}

module track(len = preview_len) {
    translate([0, len, 0])
        rotate([90, 0, 0])
            linear_extrude(height = len, convexity = 10)
                track_profile();
}

// A strip of thickness t following a polyline — for drawing the mesh.
module strip2d(path, t) {
    for (i = [0 : len(path) - 2])
        hull() {
            translate(path[i])     circle(d = t);
            translate(path[i + 1]) circle(d = t);
        }
}

// The mesh, on the path the back grip puts it on: down the channel inboard of
// the far wall's hook tips, outboard over the rib's top face through the pinch,
// then down the slot behind the rib with its free edge resting on the mid hook.
// To escape it has to slide back through the pinch and round the rib's corner.
//
// It is drawn at its full thickness inside a gap deliberately thinner than
// that, so the strip overlaps the lip by mesh_t - back_pinch in the preview.
// That overlap IS the squeeze, not a modelling error.
module mesh(len = preview_len) {
    mx_out = trk_clear_w - back_slot / 2;
    mx_in  = trk_clear_w - trk_hook_x - mesh_t / 2 - 0.25;
    mz_pin = trk_lip_z0 - back_pinch / 2;
    path = back_grip
        ? [[mx_out,       trk_hook_z1 + 0.15],
           [mx_out,       mz_pin - 0.8      ],
           [mx_out - 0.4, mz_pin            ],
           [mx_in,        mz_pin            ],
           [mx_in,        trk_depth + mesh_rise]]
        : [[mx_in,        trk_ledge_z1      ],
           [mx_in,        trk_depth + mesh_rise]];

    translate([0, len, 0])
        rotate([90, 0, 0])
            linear_extrude(height = len, convexity = 4)
                strip2d(path, mesh_t);
}

// ---------------------------------------------------------------------------
// Concept studies. Envelopes and engagements are to the measured track; the
// detailing is not, so do not print these.
// ---------------------------------------------------------------------------

ap0 = trk_ledge_x;                       // ledge-tip aperture, near edge
ap1 = trk_clear_w - trk_ledge_x;         // and far edge
dx0 = ap0 + drop_clr;                    // drop-in body, near face
dx1 = ap1 - drop_clr;                    // and far face

// Barb that springs outboard under a ledge tip. dir -1 reaches toward the near
// wall, +1 toward the far wall. Drawn deployed, i.e. as seated.
module barb2d(xface, dir) {
    zt = trk_ledge_z0 - 0.20;            // top face, under the ledge
    polygon([[xface,                              zt - 2.2],
             [xface + dir * drop_barb,            zt - 0.9],
             [xface + dir * drop_barb,            zt],
             [xface,                              zt]]);
}

module concept_drop() {
    zr = trk_ledge_z1 + (dx1 - wall - dx0) * tan(ramp_angle);
    difference() {
        union() {
            polygon([[dx0, 0], [dx1, 0], [dx1, z_top], [dx1 - wall, z_top],
                     [dx1 - wall, zr], [dx0, trk_ledge_z1]]);
            barb2d(dx0, -1);
            barb2d(dx1, +1);
        }
        // relief behind each barb leg, so they have somewhere to flex to
        translate([dx0 + flex_t, 1.2]) square([1.5, trk_ledge_z0 + 1.0]);
        translate([dx1 - flex_t - 1.5, 1.2]) square([1.5, trk_ledge_z0 + 1.0]);
    }
}

// Body shown in its locked position: foot slid outboard under the far ledge.
module concept_key_body() {
    zf = trk_ledge_z0 - 0.22;            // foot top, under the ledge
    polygon([[dx0 + key_push, 0], [dx1 + key_push, 0],
             [dx1 + key_push, zf], [dx1 - wall, zf + 0.6],
             [dx1, zf + 0.6], [dx1, z_top], [dx1 - wall, z_top],
             [dx1 - wall, zf + 0.6 + (dx1 - wall - dx0 - key_push) * tan(ramp_angle)],
             [dx0 + key_push, zf]]);
}

// Key, slid the other way: its own foot goes under the near ledge.
module concept_key_key() {
    zf = trk_ledge_z0 - 0.22;
    polygon([[clr + 0.05, 0], [dx0 + key_push - 0.25, 0],
             [dx0 + key_push - 0.25, trk_depth - 1.0],
             [dx0 + key_push - 0.25 - wall, trk_depth - 1.0],
             [dx0 + key_push - 0.25 - wall, zf],
             [clr + 0.05, zf]]);
}

module concept_section(which) {
    if      (which == "drop") concept_drop();
    else if (which == "key")  { concept_key_body(); concept_key_key(); }
    else                      profile(clr, back_pinch, "env");
}

// The three concepts, each in its own length of rail.
module concepts(len = preview_len) {
    gap = trk_outer_w + 10;   // across, not along, so the FRONT view compares
                              // the three sections side by side
    names = ["slide", "drop", "key"];
    cols  = ["darkorange", "seagreen", "steelblue"];
    for (i = [0 : 2])
        translate([i * gap, 0, 0]) {
            color("silver",  track_alpha) track(len);
            color("dimgray", mesh_alpha)  mesh(len);
            color(cols[i]) along_y(0, len) concept_section(names[i]);
        }
}

// Both back-grip variants side by side in the rail, for looking at.
module compare(len = preview_len) {
    gap = len + 25;
    for (i = [0, 1]) {
        translate([0, i * gap, 0]) {
            color("silver",  track_alpha) track(len);
            color("dimgray", mesh_alpha)  mesh(len);
            color(i == 0 ? "darkorange" : "steelblue")
                fence_length(len, clr, back_pinch);
        }
    }
}

module assembly(len = preview_len) {
    color("silver",  track_alpha) track(len);
    color("dimgray", mesh_alpha)  mesh(len);
    color("darkorange")           fence_length(len, clr);
}

// Where the seated fence and the track overlap — which must be nowhere. Build
// it and read the summary: "top level object is empty" is the pass. Anything
// with facets is metal the part is trying to occupy, and the fence will not
// seat. This is the check that the scrapped design never had.
module fitcheck(len = preview_len) {
    intersection() {
        fence_length(len, clr);
        track(len);
    }
}

// A slice with n notches cut into the top of the fence, so the printed slices
// can be told apart once they are off the plate.
module coupon_slice(pinch, n) {
    z_top = trk_depth + fence_h;
    difference() {
        fence_length(coupon_len, clr, pinch);

        // Cut down from the fence top, not into it — a cube centred on
        // z_top - coupon_notch_d leaves the slot buried inside the fence as a
        // through-hole, which is both invisible and a genus the build reports.
        for (i = [0 : n - 1])
            translate([trk_clear_w - trk_hook_x - mesh_slot - wall - eps,
                       coupon_len / 2 + (i - (n - 1) / 2) * coupon_notch_pitch
                           - coupon_notch_w / 2,
                       z_top - coupon_notch_d])
                cube([wall + 2 * eps, coupon_notch_w, coupon_notch_d + eps]);
    }
}

module coupon() {
    n = len(coupon_pinch);
    for (i = [0 : n - 1])
        translate([0, i * (coupon_len + coupon_gap), 0])
            coupon_slice(coupon_pinch[i], i + 1);
}

// The default is a preview. Say so on every run, so an accidental unnamed
// build is caught in the log rather than in the printer.
if (show == "track" || show == "assembly" || show == "compare" || show == "concepts")
    echo(str("PREVIEW ONLY (show=\"", show, "\") — NOT printable. ",
             "Build the part with -D 'show=\"fence\"'."));

if      (show == "coupon")   coupon();
else if (show == "track")    track();
else if (show == "assembly") assembly();
else if (show == "fitcheck") fitcheck();
else if (show == "compare")  compare();
else if (show == "concepts") concepts();
else if (show == "fixture")  fixture();
else                         fence();
